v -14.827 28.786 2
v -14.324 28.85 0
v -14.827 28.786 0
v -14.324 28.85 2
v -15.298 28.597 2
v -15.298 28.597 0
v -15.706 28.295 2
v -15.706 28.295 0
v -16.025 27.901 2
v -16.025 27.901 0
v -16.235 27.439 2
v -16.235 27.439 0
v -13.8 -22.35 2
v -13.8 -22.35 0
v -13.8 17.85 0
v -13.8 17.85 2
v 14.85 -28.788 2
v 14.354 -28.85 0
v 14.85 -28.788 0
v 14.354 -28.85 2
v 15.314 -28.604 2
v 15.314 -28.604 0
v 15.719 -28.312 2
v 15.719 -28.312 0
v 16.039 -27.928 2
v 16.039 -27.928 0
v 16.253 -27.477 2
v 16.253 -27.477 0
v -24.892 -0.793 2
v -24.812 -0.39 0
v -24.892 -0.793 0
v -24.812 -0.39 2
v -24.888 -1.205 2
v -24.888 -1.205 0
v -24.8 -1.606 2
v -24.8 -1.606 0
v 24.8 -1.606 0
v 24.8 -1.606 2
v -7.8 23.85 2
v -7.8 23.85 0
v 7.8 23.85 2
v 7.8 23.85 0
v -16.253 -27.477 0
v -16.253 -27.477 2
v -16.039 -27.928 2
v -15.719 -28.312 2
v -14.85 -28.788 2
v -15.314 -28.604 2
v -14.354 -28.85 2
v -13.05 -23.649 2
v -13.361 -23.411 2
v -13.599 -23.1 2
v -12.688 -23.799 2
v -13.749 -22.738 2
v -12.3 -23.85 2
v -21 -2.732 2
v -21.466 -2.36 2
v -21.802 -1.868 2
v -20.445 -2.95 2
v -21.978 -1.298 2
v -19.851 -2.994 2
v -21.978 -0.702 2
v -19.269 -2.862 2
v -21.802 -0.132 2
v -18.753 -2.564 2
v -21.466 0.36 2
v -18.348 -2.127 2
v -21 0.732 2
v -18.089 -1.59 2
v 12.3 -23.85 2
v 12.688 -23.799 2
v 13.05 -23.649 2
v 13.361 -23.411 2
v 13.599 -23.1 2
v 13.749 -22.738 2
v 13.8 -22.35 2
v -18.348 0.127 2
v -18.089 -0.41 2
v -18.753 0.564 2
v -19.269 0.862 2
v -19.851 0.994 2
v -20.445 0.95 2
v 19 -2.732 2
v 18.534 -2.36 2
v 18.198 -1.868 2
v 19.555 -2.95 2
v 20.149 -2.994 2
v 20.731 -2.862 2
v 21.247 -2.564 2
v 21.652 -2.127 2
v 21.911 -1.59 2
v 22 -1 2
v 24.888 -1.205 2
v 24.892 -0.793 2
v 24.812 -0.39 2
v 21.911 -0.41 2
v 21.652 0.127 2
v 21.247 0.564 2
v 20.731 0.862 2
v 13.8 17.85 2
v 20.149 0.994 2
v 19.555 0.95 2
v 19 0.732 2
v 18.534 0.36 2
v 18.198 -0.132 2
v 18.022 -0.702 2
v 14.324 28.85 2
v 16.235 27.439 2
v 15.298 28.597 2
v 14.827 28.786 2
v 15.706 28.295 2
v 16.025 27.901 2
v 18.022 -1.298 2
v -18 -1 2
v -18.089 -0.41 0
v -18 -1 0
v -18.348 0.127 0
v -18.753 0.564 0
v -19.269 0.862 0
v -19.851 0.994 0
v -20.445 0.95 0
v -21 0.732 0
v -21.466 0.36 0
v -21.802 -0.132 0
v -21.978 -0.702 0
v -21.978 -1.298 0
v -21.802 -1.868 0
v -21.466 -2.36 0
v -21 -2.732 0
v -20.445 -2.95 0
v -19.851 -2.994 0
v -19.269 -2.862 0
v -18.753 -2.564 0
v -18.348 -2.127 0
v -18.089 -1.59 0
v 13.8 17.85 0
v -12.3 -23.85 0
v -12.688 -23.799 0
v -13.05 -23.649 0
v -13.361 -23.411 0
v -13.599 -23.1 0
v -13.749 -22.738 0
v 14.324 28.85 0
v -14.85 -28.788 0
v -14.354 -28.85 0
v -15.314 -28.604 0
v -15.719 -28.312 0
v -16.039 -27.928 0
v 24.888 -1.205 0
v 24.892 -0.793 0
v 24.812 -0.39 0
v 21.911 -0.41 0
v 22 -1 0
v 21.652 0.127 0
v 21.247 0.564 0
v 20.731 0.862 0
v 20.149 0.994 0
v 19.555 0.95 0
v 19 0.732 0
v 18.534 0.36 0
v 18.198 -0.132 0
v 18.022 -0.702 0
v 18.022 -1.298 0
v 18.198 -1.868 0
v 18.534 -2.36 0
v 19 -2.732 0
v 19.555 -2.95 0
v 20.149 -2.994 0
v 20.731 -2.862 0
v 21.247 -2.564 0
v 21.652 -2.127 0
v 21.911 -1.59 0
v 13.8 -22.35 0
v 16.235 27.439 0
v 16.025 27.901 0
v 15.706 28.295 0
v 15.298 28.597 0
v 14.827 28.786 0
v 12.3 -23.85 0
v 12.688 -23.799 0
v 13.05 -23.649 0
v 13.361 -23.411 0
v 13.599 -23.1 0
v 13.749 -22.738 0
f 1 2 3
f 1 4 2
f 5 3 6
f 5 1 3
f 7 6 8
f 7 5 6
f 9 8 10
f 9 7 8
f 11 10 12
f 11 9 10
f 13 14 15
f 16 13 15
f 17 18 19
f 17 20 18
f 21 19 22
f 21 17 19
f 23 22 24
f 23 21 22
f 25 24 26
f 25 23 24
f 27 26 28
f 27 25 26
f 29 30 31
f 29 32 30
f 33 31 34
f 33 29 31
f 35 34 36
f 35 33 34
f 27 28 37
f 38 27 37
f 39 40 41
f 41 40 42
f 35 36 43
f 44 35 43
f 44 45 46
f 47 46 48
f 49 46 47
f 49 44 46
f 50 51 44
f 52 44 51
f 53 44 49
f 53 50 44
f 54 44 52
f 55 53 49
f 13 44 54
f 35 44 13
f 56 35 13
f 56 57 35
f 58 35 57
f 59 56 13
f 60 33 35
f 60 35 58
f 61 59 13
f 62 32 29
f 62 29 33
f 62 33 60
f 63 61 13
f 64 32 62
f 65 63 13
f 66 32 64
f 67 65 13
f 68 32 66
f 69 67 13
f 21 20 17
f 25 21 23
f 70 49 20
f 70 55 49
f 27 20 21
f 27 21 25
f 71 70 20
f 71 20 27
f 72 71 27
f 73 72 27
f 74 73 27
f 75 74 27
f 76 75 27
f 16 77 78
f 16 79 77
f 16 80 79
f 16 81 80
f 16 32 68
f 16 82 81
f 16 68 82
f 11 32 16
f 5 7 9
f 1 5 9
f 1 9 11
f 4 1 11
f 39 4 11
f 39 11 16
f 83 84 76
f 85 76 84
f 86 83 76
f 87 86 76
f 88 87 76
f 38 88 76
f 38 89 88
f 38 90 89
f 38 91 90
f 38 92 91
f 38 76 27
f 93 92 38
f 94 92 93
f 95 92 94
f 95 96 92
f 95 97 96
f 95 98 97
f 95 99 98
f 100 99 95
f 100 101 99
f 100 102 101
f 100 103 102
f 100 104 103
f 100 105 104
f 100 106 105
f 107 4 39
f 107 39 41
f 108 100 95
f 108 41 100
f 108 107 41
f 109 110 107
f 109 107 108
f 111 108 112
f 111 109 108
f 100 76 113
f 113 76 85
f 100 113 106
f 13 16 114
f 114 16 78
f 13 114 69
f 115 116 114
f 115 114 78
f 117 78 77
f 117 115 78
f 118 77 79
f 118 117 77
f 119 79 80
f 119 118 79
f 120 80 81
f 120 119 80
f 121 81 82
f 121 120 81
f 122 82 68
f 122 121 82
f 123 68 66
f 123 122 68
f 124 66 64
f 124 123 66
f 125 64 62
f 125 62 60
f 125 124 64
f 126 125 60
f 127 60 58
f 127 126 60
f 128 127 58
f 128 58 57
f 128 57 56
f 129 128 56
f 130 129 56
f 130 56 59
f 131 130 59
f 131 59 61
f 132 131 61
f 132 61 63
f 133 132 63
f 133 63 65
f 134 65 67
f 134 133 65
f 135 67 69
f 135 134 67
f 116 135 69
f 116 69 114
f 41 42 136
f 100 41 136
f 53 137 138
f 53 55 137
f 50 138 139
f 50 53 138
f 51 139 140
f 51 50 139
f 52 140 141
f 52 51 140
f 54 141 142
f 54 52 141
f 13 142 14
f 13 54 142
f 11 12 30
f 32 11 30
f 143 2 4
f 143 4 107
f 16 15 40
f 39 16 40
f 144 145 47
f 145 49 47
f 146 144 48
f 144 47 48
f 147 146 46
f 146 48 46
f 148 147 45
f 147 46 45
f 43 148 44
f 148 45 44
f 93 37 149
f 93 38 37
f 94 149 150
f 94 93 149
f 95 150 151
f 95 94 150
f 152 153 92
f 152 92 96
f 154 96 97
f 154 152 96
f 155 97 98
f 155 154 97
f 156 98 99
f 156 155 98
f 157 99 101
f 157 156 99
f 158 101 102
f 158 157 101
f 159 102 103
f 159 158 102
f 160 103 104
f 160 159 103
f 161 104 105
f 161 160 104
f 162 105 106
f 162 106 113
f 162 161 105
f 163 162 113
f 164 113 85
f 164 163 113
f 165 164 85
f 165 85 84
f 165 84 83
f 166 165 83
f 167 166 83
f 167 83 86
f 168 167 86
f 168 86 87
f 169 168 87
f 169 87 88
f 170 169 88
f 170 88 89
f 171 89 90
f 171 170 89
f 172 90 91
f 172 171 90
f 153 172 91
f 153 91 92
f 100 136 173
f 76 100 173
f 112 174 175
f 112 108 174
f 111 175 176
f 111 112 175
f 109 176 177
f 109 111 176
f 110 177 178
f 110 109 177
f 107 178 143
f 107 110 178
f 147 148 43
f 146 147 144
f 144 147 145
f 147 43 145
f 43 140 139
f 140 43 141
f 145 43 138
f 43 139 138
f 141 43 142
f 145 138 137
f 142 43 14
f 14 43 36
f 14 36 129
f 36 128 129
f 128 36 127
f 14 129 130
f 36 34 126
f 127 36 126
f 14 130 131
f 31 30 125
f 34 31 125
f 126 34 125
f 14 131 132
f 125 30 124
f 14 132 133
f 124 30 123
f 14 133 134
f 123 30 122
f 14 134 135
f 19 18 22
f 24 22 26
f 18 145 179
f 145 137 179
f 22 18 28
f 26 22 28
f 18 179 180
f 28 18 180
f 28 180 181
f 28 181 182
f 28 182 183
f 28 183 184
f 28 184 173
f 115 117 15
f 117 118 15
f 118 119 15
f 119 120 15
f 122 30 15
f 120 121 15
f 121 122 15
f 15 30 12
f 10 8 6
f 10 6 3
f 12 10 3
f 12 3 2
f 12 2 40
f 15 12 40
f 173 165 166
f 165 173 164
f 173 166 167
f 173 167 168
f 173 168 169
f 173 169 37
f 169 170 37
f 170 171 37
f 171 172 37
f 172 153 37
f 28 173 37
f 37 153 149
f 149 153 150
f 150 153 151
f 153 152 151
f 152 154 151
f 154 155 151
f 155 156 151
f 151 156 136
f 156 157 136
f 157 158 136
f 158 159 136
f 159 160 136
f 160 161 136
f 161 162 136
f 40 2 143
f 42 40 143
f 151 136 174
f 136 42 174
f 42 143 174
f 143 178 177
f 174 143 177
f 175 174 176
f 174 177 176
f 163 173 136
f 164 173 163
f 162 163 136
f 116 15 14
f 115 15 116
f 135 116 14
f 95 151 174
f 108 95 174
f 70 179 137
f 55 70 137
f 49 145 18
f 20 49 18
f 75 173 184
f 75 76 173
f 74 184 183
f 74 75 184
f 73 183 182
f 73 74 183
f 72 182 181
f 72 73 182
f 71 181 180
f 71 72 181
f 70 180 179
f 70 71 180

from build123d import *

# Parameters (mm, degrees)
F0_W     = 31.6
F0_H     = 57.7
F0_R     = 2
F1_DEPTH = 2
F2_R     = 1.5
F3_R     = 2


# Not quite as in the source:
# - a feature names something its author has since deleted; it is built from what else it names


with BuildPart() as f1:
    # F0 (on Top) → F1 (new body)
    with BuildSketch(Plane.XY):
        Rectangle(F0_W, F0_H)
        Polygon((7.8, 23.85), (13.8, 23.85), (13.8, 17.85), (13.8, -23.85), (-13.8, -23.85), (-13.8, 17.85), (-13.8, 23.85), (-7.8, 23.85), align=None, mode=Mode.SUBTRACT)
        Polygon((-15.8, -28.85), (-15.8, 28.85), (-25, -1), align=None)
        with Locations((-20, -1)):
            Circle(F0_R, mode=Mode.SUBTRACT)
        Polygon((25, -1), (15.8, 28.85), (15.8, -28.85), align=None)
        with Locations((20, -1)):
            Circle(F0_R, mode=Mode.SUBTRACT)
        Polygon((-13.8, 17.85), (-7.8, 23.85), (-13.8, 23.85), align=None)
        Polygon((13.8, 17.85), (13.8, 23.85), (7.8, 23.85), align=None)
    extrude(amount=F1_DEPTH)

    # F2
    f2_edges = [f1.edges().sort_by_distance(p)[0] for p in [
        (13.8, -23.85, 1),
        (-13.8, -23.85, 1),
    ]]
    fillet(f2_edges, radius=F2_R)

    # F3
    f3_edges = [f1.edges().sort_by_distance(p)[0] for p in [
        (15.8, -28.85, 1),
        (-15.8, -28.85, 1),
        (25, -1, 1),
        (15.8, 28.85, 1),
        (-15.8, 28.85, 1),
        (-25, -1, 1),
    ]]
    fillet(f3_edges, radius=F3_R)


solid = f1.part
